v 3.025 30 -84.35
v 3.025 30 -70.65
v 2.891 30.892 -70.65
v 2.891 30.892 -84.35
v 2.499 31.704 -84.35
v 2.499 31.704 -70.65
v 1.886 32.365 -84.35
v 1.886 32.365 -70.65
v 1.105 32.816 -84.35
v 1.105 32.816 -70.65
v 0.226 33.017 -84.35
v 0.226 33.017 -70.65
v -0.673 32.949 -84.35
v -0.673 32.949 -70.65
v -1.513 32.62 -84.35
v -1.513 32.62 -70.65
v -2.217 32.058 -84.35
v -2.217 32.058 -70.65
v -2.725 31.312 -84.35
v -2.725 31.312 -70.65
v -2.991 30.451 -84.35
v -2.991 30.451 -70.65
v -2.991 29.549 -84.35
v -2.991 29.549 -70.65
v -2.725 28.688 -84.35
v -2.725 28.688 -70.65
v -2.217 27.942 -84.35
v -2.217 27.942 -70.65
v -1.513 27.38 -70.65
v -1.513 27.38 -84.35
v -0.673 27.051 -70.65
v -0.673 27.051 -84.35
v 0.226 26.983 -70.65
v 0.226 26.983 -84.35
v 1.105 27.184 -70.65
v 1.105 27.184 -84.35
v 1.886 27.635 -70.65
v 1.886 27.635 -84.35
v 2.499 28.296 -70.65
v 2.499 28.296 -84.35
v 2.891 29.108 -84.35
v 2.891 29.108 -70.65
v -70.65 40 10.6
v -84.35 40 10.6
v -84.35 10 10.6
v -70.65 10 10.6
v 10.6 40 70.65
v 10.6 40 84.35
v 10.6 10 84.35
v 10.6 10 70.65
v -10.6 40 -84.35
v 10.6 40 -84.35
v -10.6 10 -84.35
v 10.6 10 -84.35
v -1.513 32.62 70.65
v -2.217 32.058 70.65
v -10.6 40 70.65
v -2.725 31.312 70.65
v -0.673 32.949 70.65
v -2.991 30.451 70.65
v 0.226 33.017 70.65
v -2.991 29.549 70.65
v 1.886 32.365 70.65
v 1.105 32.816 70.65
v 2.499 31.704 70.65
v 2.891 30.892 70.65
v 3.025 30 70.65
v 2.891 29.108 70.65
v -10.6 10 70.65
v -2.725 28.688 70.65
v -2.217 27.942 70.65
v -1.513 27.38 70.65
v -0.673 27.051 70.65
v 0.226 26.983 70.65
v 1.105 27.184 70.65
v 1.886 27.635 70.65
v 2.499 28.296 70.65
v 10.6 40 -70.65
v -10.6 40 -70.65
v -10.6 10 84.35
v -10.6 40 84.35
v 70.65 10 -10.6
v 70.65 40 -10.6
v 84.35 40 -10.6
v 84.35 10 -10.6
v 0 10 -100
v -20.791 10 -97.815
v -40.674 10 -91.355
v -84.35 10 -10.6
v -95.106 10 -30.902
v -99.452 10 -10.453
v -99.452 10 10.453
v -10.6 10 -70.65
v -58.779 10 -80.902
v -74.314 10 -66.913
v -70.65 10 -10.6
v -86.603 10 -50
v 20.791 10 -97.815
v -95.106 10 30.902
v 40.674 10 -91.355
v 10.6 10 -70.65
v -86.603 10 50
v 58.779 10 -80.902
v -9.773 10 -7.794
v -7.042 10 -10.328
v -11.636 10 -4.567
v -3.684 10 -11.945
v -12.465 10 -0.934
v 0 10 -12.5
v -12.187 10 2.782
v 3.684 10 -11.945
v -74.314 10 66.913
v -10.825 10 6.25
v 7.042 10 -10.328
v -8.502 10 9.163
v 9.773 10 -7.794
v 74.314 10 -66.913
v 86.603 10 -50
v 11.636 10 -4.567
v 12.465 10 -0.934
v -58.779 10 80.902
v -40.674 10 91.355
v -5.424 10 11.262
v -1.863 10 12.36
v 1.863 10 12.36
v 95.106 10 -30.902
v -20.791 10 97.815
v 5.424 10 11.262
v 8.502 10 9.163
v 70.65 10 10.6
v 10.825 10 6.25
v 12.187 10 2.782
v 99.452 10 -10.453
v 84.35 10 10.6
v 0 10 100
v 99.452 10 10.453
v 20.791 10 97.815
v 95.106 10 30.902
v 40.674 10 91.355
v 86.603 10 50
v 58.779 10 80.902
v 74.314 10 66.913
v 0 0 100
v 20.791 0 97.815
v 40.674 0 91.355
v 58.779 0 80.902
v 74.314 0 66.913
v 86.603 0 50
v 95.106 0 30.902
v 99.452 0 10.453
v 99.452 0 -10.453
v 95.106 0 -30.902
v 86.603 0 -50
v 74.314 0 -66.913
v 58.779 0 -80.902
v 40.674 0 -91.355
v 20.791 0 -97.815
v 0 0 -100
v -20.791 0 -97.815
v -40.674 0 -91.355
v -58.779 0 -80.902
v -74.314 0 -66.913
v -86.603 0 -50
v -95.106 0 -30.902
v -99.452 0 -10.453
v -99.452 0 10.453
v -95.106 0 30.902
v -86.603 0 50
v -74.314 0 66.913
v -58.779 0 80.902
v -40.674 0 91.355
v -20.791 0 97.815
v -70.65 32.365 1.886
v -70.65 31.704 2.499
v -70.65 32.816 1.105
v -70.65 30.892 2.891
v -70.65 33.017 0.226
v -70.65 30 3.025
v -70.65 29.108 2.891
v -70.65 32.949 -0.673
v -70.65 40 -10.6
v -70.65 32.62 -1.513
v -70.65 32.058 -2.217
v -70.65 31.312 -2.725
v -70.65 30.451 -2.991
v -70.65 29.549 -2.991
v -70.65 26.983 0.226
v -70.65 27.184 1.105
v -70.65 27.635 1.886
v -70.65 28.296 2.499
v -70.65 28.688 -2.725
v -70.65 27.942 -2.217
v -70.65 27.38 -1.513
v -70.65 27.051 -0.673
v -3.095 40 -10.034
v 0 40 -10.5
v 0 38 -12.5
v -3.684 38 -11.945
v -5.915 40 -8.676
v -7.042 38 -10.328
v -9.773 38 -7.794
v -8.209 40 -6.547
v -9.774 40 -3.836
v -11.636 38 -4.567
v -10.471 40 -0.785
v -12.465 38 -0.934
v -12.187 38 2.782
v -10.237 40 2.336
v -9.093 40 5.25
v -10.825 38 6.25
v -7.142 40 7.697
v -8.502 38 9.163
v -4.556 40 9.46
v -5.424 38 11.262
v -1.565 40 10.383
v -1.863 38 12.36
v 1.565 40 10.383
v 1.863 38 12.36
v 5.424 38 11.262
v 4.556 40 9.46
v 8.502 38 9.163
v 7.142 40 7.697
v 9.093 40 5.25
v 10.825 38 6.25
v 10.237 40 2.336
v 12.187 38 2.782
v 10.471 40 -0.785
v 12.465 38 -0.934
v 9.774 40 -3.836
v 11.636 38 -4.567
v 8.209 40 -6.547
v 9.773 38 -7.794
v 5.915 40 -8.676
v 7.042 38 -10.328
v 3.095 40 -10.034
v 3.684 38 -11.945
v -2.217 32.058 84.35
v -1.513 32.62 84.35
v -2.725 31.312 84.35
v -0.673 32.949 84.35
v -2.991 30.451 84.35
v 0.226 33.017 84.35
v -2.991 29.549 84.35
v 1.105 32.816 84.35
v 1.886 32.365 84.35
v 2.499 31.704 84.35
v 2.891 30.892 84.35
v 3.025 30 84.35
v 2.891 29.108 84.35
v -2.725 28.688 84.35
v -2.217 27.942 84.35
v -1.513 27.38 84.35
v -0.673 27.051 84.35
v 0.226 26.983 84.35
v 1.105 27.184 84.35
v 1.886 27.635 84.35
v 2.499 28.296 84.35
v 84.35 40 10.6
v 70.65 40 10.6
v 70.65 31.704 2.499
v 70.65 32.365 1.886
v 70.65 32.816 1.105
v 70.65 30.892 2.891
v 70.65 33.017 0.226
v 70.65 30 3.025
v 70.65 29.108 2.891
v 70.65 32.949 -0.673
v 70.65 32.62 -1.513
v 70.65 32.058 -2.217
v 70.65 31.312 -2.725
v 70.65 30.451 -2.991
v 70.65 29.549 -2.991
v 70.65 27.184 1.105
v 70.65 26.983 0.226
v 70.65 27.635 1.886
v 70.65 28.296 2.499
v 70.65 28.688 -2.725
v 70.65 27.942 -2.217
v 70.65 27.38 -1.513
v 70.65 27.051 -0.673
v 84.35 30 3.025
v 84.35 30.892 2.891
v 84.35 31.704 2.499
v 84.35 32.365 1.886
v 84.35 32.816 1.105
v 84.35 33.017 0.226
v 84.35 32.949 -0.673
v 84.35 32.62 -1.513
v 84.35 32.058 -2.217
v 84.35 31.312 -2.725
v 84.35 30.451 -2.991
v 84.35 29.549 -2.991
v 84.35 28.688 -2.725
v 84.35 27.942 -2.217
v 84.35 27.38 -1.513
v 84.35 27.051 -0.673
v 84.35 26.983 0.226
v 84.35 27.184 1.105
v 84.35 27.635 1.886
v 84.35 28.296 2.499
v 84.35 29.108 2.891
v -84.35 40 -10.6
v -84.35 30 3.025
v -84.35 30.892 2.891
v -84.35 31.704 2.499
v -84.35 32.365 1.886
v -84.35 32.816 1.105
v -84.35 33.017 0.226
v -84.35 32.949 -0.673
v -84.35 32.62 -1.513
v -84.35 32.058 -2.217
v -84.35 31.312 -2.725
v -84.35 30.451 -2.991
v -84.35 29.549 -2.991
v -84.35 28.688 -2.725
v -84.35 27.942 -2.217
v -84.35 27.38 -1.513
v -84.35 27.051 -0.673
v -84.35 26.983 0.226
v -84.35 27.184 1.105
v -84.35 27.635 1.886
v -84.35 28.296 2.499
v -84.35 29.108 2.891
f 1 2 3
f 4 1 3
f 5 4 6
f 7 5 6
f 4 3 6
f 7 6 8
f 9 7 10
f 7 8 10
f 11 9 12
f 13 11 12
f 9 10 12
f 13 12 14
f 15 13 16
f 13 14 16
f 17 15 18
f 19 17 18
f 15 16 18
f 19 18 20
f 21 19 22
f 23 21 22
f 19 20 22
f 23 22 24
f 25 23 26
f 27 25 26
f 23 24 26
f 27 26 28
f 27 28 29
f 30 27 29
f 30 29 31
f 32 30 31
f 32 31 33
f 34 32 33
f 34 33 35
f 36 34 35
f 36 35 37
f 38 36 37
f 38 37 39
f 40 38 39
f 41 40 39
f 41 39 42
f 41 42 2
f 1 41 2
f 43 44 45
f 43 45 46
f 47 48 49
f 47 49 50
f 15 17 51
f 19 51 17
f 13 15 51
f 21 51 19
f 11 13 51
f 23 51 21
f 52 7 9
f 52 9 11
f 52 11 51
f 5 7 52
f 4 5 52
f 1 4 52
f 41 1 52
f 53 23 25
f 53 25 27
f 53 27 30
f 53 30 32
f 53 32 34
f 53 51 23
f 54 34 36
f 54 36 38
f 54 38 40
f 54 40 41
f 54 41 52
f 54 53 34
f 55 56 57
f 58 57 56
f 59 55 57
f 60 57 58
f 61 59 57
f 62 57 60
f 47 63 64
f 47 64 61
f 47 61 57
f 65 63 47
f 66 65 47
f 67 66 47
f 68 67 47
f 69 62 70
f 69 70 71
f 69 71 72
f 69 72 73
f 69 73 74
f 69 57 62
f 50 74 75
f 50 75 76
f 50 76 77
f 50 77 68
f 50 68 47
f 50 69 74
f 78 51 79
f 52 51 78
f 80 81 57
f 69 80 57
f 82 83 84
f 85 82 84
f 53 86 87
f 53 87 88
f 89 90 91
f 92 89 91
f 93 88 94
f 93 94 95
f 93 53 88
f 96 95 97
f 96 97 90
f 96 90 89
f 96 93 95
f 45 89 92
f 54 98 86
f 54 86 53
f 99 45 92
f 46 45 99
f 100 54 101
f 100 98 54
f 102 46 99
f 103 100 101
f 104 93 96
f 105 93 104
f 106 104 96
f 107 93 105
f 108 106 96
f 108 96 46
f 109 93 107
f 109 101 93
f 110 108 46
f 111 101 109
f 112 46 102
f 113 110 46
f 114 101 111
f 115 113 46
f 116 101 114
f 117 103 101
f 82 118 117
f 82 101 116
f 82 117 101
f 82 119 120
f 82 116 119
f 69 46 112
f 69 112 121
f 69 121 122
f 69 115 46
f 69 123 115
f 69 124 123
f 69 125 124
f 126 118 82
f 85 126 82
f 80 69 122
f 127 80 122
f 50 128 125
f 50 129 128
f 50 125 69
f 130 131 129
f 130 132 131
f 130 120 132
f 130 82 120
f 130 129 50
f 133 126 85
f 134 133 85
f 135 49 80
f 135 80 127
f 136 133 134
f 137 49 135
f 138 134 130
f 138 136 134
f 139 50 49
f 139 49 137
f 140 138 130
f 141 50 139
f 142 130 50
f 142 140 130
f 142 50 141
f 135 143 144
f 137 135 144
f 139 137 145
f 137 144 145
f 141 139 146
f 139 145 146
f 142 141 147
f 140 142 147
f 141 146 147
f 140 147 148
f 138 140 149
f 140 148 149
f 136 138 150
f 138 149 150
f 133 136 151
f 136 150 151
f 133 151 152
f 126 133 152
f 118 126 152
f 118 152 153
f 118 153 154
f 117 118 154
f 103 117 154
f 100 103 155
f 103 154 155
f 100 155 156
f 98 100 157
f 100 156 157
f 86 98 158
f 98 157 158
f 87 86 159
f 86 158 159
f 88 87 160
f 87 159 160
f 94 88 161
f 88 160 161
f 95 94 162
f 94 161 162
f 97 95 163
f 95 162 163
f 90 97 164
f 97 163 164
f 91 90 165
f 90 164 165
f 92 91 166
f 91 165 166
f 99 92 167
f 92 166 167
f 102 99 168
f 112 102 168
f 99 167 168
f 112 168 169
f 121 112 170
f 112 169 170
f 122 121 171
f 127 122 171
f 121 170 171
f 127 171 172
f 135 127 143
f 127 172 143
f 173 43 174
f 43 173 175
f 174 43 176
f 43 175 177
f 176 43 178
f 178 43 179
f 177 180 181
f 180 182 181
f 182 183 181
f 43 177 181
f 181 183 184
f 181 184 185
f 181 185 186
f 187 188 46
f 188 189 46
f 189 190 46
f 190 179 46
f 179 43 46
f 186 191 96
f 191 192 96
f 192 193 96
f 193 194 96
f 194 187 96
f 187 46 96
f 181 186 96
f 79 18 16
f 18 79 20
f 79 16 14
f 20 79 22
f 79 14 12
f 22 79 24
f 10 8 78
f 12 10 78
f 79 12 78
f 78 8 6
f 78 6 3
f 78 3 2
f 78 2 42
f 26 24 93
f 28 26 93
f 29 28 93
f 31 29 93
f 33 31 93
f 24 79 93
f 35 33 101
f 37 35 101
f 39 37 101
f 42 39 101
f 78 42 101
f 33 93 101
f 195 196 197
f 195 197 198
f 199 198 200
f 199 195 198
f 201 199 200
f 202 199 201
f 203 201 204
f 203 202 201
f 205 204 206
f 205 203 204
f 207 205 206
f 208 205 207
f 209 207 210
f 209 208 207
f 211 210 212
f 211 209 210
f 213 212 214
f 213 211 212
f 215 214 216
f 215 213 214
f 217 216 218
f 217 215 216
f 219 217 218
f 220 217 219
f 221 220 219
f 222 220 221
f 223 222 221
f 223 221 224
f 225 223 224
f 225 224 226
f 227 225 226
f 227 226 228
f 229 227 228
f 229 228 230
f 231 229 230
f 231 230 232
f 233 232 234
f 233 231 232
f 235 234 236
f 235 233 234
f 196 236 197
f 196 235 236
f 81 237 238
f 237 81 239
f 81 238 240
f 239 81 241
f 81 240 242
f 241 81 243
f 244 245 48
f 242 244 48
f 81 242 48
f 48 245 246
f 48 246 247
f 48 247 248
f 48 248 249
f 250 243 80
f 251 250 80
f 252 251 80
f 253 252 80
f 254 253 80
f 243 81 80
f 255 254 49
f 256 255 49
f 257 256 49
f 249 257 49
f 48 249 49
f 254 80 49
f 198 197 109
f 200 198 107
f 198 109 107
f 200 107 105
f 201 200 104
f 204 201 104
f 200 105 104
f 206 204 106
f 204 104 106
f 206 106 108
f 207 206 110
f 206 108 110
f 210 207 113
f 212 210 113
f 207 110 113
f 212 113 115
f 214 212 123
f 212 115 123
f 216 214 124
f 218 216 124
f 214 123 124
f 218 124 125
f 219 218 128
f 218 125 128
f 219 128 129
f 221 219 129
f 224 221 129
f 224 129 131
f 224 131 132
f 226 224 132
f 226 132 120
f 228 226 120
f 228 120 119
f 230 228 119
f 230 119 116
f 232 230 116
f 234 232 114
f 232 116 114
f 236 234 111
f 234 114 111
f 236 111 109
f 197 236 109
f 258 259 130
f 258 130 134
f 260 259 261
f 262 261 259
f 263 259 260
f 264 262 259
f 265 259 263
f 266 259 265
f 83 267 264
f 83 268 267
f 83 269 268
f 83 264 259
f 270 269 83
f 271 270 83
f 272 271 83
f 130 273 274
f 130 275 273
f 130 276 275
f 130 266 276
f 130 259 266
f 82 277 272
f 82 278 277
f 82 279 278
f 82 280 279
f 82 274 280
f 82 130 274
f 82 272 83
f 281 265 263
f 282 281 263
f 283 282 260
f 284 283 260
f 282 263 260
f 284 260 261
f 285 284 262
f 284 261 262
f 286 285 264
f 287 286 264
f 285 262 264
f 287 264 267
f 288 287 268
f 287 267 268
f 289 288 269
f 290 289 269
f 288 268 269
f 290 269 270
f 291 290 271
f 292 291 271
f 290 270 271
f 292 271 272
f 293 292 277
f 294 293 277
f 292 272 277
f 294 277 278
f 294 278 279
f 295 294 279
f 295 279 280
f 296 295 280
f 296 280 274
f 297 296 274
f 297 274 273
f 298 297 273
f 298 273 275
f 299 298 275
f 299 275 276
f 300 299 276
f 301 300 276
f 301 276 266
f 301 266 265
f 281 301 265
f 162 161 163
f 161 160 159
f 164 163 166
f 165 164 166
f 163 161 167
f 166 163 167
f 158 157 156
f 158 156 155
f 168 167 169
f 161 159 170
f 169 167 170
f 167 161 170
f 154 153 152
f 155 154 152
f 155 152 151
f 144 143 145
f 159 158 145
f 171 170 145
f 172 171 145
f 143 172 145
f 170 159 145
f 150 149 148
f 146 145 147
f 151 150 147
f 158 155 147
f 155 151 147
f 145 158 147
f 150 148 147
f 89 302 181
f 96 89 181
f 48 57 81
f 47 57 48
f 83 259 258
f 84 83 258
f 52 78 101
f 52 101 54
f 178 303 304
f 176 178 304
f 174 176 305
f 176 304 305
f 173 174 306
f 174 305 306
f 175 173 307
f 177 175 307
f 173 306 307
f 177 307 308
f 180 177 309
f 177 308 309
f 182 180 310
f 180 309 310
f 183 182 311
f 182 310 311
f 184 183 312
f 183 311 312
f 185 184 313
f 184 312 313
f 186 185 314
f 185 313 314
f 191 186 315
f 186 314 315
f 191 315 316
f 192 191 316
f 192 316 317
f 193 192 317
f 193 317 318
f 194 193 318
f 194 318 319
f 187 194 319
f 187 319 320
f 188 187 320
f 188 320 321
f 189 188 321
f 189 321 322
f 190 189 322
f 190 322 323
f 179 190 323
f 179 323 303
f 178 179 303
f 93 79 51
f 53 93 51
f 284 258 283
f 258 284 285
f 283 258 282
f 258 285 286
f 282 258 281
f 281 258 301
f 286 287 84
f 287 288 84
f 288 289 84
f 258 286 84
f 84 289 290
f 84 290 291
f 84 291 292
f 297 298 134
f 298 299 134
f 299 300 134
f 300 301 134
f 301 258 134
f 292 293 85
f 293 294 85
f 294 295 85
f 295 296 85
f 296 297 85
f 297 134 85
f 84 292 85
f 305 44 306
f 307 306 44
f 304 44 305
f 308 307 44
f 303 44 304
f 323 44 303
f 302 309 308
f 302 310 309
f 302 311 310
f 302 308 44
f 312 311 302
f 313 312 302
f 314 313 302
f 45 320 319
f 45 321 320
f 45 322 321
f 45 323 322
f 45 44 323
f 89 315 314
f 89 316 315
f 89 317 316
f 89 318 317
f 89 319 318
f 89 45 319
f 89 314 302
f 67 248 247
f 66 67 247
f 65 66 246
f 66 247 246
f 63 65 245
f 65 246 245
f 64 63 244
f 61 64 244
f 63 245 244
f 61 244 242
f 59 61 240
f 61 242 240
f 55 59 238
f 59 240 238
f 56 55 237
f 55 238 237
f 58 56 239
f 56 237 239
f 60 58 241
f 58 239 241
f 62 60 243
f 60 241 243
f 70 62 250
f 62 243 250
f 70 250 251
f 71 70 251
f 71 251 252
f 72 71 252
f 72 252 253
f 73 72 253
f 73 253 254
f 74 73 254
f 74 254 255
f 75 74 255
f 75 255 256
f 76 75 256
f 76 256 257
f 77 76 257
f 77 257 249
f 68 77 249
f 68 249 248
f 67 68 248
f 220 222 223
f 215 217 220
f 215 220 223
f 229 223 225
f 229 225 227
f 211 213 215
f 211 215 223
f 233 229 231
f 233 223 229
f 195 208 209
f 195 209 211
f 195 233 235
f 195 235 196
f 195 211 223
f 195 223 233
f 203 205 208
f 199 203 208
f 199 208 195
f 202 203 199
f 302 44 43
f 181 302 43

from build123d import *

# Parameters (mm, degrees)
SKETCH1_R           = 100
BOSS_EXTRUDE1_DEPTH = 10
SKETCH2_W           = 21.2
SKETCH2_H           = 13.7
SKETCH2_W_2         = 13.7
SKETCH2_H_2         = 21.2
BOSS_EXTRUDE2_DEPTH = 30
SKETCH3_R           = 3.025
CUT_EXTRUDE1_DEPTH  = 190
SKETCH4_R           = 3.025
CUT_EXTRUDE2_DEPTH  = 190
SKETCH5_R           = 12.5
BOSS_EXTRUDE3_DEPTH = 30
CHAMFER1_SIZE       = 2


with BuildPart() as part:
    # Sketch1 → Boss-Extrude1 (new body)
    with BuildSketch(Plane(origin=(0, 0, 0), x_dir=(1, 0, 0), z_dir=(0, 1, 0))):
        with Locations(Location((0, 0, 0), (0, 0, 270))):
            Circle(SKETCH1_R)
    extrude(amount=BOSS_EXTRUDE1_DEPTH)

    # Sketch2 → Boss-Extrude2 (add)
    with BuildSketch(Plane(origin=(0, 10, 0), x_dir=(1, 0, 0), z_dir=(0, 1, 0))):
        with Locations((0, -77.5)):
            Rectangle(SKETCH2_W, SKETCH2_H)
        with Locations((77.5, 0)):
            Rectangle(SKETCH2_W_2, SKETCH2_H_2)
        with Locations((-77.5, 0)):
            Rectangle(SKETCH2_W_2, SKETCH2_H_2)
        with Locations((0, 77.5)):
            Rectangle(SKETCH2_W, SKETCH2_H)
    extrude(amount=BOSS_EXTRUDE2_DEPTH)

    # Sketch3 → Cut-Extrude1 (cut)
    with BuildSketch(Plane.ZY.offset(84.35)):
        with Locations((0, 30)):
            Circle(SKETCH3_R)
    extrude(amount=-CUT_EXTRUDE1_DEPTH, mode=Mode.SUBTRACT)

    # Sketch4 → Cut-Extrude2 (cut)
    with BuildSketch(Plane.XY.offset(84.35)):
        with Locations((0, 30)):
            Circle(SKETCH4_R)
    extrude(amount=-CUT_EXTRUDE2_DEPTH, mode=Mode.SUBTRACT)

    # Sketch5 → Boss-Extrude3 (add)
    with BuildSketch(Plane(origin=(0, 10, 0), x_dir=(1, 0, 0), z_dir=(0, 1, 0))):
        with Locations(Location((0, 0, 0), (0, 0, 90))):
            Circle(SKETCH5_R)
    extrude(amount=BOSS_EXTRUDE3_DEPTH)

    # Chamfer1
    chamfer1_edges = [part.edges().sort_by_distance(p)[0] for p in [
        (0, 40, 12.5),
    ]]
    chamfer(chamfer1_edges, length=CHAMFER1_SIZE)


solid = part.part
